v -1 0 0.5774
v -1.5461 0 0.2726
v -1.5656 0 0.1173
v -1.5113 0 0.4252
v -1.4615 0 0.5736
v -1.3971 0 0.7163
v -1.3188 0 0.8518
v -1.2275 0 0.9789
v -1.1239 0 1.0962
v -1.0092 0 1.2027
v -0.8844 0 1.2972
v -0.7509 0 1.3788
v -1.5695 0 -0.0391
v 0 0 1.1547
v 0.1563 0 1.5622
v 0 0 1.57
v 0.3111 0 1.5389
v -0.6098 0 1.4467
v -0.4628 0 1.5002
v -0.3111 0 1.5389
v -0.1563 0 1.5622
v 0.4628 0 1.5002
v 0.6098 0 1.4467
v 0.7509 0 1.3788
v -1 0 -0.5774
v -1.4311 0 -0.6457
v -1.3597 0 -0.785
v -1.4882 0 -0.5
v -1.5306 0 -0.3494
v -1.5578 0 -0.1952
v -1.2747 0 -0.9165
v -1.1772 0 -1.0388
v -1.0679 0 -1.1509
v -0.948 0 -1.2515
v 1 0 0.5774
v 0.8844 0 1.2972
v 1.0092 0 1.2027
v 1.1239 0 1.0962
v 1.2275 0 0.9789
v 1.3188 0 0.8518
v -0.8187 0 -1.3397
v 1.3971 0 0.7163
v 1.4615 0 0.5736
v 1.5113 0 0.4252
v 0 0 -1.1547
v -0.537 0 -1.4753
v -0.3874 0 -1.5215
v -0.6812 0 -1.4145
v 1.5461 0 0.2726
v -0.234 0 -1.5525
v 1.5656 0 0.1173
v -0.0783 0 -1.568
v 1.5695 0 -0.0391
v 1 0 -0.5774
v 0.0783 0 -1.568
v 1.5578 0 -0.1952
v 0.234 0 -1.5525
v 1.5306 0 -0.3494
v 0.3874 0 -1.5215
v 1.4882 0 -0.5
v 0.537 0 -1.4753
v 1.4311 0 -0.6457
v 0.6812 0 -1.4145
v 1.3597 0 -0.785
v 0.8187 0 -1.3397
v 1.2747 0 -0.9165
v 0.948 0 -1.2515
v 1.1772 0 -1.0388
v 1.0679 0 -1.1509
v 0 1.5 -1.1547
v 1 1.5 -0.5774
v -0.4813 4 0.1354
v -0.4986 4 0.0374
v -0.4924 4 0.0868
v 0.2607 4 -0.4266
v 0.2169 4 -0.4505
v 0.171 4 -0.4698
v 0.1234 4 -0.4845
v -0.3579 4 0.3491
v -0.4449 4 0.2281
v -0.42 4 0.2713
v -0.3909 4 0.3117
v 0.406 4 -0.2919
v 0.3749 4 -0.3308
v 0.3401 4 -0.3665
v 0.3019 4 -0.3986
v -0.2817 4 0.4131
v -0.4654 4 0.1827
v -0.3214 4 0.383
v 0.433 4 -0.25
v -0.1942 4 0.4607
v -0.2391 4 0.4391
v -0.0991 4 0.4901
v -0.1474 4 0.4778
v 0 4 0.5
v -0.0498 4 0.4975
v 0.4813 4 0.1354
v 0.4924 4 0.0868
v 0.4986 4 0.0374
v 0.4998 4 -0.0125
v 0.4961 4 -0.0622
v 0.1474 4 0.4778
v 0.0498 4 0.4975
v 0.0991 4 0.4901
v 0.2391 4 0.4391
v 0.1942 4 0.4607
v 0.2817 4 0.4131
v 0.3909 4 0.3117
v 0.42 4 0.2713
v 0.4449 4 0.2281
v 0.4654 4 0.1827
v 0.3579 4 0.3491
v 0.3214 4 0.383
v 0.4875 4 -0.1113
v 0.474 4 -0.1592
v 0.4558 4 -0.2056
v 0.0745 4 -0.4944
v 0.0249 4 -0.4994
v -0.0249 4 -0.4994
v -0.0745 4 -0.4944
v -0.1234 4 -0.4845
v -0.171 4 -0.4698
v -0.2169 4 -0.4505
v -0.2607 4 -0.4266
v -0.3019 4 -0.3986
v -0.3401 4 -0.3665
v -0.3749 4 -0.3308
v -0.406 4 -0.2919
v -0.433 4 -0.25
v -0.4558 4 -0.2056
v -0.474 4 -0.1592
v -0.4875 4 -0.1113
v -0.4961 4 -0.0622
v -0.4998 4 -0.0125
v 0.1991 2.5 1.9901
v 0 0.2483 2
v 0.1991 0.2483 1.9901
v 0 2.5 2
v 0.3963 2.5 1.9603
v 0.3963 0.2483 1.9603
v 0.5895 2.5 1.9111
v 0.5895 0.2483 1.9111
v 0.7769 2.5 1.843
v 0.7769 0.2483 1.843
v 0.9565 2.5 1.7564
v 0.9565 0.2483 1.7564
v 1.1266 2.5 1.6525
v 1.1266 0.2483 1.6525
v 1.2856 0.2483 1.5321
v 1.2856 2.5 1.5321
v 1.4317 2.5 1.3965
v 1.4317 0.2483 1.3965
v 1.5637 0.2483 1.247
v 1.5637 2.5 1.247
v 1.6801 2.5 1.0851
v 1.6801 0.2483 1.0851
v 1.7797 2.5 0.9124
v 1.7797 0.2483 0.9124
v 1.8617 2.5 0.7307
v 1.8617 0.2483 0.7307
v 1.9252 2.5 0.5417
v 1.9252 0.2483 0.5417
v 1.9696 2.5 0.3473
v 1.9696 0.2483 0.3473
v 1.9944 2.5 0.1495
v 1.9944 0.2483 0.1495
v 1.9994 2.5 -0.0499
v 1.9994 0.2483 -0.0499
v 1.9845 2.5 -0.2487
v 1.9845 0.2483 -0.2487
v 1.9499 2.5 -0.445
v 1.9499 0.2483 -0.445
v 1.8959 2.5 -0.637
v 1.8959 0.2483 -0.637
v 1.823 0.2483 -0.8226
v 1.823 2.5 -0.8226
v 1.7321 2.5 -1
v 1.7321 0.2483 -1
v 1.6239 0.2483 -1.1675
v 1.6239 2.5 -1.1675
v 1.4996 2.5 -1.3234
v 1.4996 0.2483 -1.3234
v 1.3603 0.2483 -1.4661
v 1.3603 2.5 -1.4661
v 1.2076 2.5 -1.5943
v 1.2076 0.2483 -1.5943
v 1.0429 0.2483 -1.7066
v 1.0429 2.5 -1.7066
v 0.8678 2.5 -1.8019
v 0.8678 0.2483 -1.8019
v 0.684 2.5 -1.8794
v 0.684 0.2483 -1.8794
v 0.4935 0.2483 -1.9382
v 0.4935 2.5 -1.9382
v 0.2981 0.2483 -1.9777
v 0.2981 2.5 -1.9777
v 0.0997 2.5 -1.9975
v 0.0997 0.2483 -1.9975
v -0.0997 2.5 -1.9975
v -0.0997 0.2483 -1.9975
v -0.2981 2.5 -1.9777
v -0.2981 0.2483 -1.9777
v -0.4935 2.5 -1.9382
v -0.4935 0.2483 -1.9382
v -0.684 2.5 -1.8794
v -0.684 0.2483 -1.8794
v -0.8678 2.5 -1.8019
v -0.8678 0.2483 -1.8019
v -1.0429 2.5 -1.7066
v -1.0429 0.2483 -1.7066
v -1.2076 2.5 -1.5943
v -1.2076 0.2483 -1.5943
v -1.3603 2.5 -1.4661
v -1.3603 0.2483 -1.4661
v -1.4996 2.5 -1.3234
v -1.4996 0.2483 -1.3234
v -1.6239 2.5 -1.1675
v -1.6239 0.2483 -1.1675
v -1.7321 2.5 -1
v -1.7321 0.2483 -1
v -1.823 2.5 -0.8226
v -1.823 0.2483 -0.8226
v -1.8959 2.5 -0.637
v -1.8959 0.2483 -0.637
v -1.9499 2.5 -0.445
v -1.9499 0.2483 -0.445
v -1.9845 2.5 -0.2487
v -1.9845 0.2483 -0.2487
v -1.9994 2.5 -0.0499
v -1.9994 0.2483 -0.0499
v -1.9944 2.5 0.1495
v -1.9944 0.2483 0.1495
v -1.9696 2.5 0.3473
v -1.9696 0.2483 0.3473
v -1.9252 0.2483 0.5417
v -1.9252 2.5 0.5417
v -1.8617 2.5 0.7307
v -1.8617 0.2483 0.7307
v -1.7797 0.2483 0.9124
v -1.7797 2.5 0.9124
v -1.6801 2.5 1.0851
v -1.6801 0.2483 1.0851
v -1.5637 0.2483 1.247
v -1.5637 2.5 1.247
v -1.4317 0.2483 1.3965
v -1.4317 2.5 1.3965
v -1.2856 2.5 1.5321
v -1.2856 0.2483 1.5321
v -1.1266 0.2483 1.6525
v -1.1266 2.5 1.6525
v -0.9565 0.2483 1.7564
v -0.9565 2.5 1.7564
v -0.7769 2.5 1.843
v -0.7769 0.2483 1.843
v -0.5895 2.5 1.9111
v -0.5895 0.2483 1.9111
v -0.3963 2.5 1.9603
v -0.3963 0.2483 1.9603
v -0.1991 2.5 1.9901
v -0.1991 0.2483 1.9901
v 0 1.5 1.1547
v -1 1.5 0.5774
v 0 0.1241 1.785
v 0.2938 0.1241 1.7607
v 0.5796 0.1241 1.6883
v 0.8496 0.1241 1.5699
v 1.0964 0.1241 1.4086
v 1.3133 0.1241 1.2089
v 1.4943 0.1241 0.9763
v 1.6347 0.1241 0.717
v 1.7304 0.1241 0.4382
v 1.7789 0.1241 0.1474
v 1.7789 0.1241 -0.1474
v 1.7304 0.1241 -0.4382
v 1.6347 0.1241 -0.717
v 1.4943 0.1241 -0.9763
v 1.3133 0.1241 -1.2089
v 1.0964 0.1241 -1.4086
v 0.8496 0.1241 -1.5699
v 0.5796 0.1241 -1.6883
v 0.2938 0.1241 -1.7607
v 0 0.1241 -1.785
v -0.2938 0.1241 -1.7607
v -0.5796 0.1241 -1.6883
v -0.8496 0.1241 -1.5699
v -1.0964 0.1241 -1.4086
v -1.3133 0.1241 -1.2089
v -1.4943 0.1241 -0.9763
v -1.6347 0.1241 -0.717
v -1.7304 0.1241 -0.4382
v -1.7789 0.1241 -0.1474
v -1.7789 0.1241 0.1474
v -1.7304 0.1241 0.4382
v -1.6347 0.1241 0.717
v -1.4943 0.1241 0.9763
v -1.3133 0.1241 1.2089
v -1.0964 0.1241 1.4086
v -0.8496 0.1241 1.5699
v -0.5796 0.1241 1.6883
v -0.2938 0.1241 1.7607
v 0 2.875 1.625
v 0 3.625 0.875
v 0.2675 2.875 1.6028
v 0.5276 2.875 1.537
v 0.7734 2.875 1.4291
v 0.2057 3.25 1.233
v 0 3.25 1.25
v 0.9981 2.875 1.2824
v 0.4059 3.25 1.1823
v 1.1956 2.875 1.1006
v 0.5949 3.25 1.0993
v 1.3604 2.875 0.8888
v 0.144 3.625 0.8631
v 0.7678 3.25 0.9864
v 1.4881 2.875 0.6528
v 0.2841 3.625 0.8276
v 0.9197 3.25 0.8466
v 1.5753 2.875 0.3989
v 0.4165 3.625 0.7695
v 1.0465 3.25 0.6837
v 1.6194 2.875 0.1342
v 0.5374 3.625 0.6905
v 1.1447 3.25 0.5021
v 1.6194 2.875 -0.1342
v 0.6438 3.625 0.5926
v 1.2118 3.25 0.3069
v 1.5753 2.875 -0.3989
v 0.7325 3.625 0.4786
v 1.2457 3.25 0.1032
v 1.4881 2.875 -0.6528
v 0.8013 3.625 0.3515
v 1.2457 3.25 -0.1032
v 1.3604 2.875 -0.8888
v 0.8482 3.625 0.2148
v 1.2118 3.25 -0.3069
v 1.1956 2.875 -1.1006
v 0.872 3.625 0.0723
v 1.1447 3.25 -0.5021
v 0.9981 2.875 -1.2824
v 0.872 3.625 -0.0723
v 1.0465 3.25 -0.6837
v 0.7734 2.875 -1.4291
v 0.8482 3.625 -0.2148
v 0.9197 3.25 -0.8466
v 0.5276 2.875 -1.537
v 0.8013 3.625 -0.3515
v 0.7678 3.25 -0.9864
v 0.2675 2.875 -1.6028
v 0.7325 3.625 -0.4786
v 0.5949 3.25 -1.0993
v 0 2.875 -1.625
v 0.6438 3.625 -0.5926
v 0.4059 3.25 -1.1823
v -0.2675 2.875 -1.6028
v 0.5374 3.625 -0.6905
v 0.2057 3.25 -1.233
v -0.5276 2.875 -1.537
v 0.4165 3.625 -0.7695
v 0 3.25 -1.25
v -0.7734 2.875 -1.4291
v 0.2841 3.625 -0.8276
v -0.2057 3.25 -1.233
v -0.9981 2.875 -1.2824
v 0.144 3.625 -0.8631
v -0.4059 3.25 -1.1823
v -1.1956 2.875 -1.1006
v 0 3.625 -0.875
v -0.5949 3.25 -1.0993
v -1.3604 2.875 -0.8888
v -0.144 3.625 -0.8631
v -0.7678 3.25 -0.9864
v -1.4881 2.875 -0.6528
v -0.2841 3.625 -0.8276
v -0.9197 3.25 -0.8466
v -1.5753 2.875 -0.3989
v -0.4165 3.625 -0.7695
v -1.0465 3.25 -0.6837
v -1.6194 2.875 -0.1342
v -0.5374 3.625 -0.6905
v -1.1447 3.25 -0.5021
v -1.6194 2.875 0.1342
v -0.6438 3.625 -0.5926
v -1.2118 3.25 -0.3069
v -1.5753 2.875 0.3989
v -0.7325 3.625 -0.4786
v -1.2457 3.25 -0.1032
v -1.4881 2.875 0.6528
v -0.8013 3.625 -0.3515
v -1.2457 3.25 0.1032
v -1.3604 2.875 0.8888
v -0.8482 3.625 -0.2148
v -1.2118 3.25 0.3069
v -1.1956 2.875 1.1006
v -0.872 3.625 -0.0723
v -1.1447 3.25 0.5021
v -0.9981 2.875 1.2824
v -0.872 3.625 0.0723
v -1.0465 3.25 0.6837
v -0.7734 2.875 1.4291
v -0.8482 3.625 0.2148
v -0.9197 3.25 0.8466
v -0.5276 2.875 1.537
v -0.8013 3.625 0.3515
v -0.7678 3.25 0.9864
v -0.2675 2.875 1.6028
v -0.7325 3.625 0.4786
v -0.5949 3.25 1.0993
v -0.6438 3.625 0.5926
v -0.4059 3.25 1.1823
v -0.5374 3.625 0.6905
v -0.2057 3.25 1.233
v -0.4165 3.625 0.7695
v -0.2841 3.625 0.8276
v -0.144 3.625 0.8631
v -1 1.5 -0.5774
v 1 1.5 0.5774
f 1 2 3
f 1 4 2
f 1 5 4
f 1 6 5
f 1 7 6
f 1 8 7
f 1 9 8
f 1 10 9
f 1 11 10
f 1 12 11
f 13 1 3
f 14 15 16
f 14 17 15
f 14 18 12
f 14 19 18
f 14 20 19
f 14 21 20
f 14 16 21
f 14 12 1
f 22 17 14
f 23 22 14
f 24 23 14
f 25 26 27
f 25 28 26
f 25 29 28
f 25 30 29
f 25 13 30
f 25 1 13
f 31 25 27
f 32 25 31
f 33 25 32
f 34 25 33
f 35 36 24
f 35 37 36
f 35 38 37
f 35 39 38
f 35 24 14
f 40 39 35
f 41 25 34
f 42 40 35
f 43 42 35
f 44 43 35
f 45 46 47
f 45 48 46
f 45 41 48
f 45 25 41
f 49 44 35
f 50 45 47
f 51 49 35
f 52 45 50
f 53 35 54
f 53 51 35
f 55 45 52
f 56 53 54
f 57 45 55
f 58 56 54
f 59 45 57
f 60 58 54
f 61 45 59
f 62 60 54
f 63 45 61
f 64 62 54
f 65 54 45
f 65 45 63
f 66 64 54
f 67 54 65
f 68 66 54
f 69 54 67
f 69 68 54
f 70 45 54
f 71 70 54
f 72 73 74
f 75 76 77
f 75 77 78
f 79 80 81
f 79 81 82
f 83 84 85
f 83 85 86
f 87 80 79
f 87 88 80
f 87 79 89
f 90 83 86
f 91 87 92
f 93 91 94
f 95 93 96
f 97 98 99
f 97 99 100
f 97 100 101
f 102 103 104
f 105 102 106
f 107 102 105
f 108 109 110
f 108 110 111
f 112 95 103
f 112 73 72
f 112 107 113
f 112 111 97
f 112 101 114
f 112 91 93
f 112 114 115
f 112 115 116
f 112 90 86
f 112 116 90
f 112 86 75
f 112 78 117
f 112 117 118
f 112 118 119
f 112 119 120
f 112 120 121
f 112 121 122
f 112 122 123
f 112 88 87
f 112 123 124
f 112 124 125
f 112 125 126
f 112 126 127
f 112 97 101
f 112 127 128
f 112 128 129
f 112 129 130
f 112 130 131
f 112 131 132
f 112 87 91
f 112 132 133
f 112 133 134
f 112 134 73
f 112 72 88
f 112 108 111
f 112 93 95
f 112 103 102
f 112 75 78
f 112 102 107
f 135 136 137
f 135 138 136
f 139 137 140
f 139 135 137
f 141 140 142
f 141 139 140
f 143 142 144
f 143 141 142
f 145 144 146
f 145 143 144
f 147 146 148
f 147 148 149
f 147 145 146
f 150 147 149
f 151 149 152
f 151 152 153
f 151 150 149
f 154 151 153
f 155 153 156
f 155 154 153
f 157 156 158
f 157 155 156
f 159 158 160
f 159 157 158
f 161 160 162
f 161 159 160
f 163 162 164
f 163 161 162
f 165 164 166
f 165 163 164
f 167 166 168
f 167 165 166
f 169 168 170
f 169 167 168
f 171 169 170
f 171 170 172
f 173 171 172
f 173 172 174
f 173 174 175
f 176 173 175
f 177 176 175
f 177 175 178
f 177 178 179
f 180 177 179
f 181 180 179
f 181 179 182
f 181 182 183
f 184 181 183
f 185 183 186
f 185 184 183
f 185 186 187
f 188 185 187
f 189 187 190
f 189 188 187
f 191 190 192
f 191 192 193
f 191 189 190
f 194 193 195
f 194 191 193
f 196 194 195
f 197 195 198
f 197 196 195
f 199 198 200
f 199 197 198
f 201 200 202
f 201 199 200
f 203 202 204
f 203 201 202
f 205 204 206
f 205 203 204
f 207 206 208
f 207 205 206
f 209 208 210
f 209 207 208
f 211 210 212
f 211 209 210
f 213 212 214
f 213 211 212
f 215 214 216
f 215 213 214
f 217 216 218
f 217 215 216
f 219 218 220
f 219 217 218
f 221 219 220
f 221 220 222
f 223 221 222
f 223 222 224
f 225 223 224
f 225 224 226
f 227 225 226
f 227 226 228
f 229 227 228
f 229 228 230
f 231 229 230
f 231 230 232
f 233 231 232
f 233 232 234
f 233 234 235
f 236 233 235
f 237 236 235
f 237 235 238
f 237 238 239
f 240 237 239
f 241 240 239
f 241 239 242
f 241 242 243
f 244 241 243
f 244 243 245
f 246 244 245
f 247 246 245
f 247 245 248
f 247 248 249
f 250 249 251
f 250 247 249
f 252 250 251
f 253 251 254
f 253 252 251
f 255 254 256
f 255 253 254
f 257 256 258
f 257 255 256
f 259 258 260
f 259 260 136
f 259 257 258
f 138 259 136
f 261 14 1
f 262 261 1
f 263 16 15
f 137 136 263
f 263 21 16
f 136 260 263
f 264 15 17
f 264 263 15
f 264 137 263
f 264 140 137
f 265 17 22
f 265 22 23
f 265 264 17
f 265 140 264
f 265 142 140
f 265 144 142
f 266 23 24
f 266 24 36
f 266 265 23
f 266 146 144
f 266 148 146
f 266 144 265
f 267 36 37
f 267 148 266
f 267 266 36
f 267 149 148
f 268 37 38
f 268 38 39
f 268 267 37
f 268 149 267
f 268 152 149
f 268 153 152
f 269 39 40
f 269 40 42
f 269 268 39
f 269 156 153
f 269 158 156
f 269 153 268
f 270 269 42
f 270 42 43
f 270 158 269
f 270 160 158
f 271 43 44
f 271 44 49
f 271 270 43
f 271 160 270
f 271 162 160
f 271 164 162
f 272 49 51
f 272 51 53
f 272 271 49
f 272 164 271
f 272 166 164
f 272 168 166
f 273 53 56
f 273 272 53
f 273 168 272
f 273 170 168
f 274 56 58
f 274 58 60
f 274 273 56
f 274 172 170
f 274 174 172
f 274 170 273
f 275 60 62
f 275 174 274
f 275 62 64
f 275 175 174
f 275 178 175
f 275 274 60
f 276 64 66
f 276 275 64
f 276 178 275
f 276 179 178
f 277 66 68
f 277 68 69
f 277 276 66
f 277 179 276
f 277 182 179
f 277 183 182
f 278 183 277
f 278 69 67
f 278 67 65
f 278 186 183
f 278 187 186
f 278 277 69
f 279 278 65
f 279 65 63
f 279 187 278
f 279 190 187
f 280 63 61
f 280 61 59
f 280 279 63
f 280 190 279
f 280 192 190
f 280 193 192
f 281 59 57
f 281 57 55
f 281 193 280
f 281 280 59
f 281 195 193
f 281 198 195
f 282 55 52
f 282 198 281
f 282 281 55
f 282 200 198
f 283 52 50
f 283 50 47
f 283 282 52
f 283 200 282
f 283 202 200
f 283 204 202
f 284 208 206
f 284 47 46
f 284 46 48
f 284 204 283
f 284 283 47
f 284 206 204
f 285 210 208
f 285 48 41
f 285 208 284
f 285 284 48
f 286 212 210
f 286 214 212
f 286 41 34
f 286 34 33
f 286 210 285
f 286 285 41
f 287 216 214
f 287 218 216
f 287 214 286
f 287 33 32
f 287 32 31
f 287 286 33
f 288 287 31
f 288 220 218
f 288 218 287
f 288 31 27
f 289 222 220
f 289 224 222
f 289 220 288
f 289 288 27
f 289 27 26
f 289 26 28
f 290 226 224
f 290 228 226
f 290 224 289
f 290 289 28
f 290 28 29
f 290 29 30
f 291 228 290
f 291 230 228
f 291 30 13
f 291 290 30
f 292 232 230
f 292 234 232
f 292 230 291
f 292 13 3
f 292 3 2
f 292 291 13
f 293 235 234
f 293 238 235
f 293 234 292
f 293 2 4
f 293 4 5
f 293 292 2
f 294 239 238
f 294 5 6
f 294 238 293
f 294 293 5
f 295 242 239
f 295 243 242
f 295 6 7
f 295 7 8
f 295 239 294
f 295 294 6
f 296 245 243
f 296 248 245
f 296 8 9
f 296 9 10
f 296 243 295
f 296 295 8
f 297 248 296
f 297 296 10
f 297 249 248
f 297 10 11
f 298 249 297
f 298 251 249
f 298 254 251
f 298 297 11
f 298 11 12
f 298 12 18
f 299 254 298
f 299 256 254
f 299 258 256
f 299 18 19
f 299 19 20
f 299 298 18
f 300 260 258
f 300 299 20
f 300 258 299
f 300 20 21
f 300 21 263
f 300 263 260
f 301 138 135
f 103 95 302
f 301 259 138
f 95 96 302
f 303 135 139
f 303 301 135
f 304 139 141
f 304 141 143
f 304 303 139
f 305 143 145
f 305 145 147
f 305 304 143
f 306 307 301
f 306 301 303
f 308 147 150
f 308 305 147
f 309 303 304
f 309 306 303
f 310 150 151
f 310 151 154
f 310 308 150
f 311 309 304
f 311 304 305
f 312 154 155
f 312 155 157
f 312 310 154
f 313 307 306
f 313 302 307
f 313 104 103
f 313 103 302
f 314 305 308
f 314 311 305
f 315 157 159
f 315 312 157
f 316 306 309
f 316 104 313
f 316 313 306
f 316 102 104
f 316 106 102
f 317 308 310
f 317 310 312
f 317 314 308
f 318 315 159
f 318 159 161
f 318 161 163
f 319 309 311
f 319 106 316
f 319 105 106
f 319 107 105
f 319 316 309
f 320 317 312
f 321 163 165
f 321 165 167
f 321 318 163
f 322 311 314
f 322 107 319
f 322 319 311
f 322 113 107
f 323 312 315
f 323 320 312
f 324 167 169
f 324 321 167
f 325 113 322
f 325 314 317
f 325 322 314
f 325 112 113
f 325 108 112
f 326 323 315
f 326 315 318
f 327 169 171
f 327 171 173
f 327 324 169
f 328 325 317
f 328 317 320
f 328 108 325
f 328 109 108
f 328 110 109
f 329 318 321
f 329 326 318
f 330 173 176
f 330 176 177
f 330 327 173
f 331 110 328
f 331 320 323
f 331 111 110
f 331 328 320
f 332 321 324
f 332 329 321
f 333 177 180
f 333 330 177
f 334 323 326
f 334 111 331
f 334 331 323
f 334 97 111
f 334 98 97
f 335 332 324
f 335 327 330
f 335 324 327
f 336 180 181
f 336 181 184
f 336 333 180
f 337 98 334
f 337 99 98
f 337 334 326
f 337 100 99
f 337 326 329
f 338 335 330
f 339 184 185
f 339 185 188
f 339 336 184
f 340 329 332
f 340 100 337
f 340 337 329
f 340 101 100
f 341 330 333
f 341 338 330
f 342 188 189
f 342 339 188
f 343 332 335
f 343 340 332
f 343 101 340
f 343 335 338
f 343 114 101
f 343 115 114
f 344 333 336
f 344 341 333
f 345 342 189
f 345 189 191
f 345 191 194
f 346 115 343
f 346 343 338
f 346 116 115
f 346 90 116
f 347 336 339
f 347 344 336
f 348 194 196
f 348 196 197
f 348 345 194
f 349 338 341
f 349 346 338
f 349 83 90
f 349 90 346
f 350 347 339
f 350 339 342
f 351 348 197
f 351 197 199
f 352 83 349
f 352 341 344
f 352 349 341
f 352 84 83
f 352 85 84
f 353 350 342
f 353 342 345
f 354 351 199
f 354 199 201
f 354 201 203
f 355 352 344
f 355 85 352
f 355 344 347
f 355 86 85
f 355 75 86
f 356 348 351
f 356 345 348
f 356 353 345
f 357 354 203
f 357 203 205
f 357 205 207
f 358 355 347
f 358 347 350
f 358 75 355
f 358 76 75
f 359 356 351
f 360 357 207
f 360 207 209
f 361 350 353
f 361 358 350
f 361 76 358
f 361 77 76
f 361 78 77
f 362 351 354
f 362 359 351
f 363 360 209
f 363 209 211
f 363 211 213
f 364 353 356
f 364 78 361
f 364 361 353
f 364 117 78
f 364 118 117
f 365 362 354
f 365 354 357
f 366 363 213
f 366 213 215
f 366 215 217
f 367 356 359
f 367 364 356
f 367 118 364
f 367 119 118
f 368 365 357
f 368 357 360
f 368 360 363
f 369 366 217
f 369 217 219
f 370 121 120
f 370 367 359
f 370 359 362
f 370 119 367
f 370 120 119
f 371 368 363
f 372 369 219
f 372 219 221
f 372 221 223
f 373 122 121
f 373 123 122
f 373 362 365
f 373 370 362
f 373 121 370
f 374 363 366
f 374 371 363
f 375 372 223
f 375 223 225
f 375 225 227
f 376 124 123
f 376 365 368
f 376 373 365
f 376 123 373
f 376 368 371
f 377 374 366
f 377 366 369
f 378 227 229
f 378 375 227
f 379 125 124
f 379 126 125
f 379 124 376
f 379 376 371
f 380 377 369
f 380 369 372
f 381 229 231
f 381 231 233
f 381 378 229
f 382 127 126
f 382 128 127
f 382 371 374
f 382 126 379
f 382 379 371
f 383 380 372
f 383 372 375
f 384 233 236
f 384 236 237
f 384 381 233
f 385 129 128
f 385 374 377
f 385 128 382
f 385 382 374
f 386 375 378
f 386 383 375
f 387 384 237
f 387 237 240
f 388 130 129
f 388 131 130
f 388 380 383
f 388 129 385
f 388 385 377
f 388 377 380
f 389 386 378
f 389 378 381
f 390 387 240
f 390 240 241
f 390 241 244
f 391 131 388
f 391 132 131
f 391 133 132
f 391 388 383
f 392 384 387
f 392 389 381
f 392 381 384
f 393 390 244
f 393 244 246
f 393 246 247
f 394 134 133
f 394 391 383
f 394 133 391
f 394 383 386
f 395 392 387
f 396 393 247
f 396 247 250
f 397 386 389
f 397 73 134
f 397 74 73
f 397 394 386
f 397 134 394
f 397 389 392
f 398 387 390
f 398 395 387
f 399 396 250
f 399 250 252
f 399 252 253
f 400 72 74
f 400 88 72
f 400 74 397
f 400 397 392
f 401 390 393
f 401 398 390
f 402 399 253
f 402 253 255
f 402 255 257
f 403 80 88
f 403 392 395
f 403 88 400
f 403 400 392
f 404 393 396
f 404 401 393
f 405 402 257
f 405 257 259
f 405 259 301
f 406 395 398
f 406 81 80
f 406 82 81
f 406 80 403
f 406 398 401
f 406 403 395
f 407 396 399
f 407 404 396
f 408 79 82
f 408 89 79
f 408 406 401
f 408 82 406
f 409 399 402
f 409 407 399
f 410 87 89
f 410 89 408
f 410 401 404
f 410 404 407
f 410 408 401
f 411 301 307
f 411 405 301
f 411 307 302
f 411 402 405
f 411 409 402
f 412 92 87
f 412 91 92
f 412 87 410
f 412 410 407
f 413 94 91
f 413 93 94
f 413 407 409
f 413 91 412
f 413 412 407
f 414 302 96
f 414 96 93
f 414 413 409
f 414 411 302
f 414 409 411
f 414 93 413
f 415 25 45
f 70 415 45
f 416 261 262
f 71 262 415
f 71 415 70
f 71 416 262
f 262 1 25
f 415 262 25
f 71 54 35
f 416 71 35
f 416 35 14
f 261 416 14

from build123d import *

# Parameters (mm, degrees)
POCKET_DEPTH = 1.5


with BuildPart() as part:
    # Sketch → Revolution (revolve)
    with BuildSketch(Plane.YZ):
        Polygon((0, 0), (0, 1.57), (0.248261, 2), (2.5, 2), (4, 0.5), (4, 0), align=None)
    revolve(axis=Axis((0, 0, 0), (0, 1, 0)))

    # Sketch001 → Pocket (cut)
    with BuildSketch(Plane(origin=(0, 0, 0), x_dir=(0, 0, -1), z_dir=(0, -1, 0))):
        Polygon((-0.57735, -1), (0.57735, -1), (1.154701, 0), (0.57735, 1), (-0.57735, 1), (-1.154701, 0), align=None)
    extrude(amount=-POCKET_DEPTH, mode=Mode.SUBTRACT)


solid = part.part
